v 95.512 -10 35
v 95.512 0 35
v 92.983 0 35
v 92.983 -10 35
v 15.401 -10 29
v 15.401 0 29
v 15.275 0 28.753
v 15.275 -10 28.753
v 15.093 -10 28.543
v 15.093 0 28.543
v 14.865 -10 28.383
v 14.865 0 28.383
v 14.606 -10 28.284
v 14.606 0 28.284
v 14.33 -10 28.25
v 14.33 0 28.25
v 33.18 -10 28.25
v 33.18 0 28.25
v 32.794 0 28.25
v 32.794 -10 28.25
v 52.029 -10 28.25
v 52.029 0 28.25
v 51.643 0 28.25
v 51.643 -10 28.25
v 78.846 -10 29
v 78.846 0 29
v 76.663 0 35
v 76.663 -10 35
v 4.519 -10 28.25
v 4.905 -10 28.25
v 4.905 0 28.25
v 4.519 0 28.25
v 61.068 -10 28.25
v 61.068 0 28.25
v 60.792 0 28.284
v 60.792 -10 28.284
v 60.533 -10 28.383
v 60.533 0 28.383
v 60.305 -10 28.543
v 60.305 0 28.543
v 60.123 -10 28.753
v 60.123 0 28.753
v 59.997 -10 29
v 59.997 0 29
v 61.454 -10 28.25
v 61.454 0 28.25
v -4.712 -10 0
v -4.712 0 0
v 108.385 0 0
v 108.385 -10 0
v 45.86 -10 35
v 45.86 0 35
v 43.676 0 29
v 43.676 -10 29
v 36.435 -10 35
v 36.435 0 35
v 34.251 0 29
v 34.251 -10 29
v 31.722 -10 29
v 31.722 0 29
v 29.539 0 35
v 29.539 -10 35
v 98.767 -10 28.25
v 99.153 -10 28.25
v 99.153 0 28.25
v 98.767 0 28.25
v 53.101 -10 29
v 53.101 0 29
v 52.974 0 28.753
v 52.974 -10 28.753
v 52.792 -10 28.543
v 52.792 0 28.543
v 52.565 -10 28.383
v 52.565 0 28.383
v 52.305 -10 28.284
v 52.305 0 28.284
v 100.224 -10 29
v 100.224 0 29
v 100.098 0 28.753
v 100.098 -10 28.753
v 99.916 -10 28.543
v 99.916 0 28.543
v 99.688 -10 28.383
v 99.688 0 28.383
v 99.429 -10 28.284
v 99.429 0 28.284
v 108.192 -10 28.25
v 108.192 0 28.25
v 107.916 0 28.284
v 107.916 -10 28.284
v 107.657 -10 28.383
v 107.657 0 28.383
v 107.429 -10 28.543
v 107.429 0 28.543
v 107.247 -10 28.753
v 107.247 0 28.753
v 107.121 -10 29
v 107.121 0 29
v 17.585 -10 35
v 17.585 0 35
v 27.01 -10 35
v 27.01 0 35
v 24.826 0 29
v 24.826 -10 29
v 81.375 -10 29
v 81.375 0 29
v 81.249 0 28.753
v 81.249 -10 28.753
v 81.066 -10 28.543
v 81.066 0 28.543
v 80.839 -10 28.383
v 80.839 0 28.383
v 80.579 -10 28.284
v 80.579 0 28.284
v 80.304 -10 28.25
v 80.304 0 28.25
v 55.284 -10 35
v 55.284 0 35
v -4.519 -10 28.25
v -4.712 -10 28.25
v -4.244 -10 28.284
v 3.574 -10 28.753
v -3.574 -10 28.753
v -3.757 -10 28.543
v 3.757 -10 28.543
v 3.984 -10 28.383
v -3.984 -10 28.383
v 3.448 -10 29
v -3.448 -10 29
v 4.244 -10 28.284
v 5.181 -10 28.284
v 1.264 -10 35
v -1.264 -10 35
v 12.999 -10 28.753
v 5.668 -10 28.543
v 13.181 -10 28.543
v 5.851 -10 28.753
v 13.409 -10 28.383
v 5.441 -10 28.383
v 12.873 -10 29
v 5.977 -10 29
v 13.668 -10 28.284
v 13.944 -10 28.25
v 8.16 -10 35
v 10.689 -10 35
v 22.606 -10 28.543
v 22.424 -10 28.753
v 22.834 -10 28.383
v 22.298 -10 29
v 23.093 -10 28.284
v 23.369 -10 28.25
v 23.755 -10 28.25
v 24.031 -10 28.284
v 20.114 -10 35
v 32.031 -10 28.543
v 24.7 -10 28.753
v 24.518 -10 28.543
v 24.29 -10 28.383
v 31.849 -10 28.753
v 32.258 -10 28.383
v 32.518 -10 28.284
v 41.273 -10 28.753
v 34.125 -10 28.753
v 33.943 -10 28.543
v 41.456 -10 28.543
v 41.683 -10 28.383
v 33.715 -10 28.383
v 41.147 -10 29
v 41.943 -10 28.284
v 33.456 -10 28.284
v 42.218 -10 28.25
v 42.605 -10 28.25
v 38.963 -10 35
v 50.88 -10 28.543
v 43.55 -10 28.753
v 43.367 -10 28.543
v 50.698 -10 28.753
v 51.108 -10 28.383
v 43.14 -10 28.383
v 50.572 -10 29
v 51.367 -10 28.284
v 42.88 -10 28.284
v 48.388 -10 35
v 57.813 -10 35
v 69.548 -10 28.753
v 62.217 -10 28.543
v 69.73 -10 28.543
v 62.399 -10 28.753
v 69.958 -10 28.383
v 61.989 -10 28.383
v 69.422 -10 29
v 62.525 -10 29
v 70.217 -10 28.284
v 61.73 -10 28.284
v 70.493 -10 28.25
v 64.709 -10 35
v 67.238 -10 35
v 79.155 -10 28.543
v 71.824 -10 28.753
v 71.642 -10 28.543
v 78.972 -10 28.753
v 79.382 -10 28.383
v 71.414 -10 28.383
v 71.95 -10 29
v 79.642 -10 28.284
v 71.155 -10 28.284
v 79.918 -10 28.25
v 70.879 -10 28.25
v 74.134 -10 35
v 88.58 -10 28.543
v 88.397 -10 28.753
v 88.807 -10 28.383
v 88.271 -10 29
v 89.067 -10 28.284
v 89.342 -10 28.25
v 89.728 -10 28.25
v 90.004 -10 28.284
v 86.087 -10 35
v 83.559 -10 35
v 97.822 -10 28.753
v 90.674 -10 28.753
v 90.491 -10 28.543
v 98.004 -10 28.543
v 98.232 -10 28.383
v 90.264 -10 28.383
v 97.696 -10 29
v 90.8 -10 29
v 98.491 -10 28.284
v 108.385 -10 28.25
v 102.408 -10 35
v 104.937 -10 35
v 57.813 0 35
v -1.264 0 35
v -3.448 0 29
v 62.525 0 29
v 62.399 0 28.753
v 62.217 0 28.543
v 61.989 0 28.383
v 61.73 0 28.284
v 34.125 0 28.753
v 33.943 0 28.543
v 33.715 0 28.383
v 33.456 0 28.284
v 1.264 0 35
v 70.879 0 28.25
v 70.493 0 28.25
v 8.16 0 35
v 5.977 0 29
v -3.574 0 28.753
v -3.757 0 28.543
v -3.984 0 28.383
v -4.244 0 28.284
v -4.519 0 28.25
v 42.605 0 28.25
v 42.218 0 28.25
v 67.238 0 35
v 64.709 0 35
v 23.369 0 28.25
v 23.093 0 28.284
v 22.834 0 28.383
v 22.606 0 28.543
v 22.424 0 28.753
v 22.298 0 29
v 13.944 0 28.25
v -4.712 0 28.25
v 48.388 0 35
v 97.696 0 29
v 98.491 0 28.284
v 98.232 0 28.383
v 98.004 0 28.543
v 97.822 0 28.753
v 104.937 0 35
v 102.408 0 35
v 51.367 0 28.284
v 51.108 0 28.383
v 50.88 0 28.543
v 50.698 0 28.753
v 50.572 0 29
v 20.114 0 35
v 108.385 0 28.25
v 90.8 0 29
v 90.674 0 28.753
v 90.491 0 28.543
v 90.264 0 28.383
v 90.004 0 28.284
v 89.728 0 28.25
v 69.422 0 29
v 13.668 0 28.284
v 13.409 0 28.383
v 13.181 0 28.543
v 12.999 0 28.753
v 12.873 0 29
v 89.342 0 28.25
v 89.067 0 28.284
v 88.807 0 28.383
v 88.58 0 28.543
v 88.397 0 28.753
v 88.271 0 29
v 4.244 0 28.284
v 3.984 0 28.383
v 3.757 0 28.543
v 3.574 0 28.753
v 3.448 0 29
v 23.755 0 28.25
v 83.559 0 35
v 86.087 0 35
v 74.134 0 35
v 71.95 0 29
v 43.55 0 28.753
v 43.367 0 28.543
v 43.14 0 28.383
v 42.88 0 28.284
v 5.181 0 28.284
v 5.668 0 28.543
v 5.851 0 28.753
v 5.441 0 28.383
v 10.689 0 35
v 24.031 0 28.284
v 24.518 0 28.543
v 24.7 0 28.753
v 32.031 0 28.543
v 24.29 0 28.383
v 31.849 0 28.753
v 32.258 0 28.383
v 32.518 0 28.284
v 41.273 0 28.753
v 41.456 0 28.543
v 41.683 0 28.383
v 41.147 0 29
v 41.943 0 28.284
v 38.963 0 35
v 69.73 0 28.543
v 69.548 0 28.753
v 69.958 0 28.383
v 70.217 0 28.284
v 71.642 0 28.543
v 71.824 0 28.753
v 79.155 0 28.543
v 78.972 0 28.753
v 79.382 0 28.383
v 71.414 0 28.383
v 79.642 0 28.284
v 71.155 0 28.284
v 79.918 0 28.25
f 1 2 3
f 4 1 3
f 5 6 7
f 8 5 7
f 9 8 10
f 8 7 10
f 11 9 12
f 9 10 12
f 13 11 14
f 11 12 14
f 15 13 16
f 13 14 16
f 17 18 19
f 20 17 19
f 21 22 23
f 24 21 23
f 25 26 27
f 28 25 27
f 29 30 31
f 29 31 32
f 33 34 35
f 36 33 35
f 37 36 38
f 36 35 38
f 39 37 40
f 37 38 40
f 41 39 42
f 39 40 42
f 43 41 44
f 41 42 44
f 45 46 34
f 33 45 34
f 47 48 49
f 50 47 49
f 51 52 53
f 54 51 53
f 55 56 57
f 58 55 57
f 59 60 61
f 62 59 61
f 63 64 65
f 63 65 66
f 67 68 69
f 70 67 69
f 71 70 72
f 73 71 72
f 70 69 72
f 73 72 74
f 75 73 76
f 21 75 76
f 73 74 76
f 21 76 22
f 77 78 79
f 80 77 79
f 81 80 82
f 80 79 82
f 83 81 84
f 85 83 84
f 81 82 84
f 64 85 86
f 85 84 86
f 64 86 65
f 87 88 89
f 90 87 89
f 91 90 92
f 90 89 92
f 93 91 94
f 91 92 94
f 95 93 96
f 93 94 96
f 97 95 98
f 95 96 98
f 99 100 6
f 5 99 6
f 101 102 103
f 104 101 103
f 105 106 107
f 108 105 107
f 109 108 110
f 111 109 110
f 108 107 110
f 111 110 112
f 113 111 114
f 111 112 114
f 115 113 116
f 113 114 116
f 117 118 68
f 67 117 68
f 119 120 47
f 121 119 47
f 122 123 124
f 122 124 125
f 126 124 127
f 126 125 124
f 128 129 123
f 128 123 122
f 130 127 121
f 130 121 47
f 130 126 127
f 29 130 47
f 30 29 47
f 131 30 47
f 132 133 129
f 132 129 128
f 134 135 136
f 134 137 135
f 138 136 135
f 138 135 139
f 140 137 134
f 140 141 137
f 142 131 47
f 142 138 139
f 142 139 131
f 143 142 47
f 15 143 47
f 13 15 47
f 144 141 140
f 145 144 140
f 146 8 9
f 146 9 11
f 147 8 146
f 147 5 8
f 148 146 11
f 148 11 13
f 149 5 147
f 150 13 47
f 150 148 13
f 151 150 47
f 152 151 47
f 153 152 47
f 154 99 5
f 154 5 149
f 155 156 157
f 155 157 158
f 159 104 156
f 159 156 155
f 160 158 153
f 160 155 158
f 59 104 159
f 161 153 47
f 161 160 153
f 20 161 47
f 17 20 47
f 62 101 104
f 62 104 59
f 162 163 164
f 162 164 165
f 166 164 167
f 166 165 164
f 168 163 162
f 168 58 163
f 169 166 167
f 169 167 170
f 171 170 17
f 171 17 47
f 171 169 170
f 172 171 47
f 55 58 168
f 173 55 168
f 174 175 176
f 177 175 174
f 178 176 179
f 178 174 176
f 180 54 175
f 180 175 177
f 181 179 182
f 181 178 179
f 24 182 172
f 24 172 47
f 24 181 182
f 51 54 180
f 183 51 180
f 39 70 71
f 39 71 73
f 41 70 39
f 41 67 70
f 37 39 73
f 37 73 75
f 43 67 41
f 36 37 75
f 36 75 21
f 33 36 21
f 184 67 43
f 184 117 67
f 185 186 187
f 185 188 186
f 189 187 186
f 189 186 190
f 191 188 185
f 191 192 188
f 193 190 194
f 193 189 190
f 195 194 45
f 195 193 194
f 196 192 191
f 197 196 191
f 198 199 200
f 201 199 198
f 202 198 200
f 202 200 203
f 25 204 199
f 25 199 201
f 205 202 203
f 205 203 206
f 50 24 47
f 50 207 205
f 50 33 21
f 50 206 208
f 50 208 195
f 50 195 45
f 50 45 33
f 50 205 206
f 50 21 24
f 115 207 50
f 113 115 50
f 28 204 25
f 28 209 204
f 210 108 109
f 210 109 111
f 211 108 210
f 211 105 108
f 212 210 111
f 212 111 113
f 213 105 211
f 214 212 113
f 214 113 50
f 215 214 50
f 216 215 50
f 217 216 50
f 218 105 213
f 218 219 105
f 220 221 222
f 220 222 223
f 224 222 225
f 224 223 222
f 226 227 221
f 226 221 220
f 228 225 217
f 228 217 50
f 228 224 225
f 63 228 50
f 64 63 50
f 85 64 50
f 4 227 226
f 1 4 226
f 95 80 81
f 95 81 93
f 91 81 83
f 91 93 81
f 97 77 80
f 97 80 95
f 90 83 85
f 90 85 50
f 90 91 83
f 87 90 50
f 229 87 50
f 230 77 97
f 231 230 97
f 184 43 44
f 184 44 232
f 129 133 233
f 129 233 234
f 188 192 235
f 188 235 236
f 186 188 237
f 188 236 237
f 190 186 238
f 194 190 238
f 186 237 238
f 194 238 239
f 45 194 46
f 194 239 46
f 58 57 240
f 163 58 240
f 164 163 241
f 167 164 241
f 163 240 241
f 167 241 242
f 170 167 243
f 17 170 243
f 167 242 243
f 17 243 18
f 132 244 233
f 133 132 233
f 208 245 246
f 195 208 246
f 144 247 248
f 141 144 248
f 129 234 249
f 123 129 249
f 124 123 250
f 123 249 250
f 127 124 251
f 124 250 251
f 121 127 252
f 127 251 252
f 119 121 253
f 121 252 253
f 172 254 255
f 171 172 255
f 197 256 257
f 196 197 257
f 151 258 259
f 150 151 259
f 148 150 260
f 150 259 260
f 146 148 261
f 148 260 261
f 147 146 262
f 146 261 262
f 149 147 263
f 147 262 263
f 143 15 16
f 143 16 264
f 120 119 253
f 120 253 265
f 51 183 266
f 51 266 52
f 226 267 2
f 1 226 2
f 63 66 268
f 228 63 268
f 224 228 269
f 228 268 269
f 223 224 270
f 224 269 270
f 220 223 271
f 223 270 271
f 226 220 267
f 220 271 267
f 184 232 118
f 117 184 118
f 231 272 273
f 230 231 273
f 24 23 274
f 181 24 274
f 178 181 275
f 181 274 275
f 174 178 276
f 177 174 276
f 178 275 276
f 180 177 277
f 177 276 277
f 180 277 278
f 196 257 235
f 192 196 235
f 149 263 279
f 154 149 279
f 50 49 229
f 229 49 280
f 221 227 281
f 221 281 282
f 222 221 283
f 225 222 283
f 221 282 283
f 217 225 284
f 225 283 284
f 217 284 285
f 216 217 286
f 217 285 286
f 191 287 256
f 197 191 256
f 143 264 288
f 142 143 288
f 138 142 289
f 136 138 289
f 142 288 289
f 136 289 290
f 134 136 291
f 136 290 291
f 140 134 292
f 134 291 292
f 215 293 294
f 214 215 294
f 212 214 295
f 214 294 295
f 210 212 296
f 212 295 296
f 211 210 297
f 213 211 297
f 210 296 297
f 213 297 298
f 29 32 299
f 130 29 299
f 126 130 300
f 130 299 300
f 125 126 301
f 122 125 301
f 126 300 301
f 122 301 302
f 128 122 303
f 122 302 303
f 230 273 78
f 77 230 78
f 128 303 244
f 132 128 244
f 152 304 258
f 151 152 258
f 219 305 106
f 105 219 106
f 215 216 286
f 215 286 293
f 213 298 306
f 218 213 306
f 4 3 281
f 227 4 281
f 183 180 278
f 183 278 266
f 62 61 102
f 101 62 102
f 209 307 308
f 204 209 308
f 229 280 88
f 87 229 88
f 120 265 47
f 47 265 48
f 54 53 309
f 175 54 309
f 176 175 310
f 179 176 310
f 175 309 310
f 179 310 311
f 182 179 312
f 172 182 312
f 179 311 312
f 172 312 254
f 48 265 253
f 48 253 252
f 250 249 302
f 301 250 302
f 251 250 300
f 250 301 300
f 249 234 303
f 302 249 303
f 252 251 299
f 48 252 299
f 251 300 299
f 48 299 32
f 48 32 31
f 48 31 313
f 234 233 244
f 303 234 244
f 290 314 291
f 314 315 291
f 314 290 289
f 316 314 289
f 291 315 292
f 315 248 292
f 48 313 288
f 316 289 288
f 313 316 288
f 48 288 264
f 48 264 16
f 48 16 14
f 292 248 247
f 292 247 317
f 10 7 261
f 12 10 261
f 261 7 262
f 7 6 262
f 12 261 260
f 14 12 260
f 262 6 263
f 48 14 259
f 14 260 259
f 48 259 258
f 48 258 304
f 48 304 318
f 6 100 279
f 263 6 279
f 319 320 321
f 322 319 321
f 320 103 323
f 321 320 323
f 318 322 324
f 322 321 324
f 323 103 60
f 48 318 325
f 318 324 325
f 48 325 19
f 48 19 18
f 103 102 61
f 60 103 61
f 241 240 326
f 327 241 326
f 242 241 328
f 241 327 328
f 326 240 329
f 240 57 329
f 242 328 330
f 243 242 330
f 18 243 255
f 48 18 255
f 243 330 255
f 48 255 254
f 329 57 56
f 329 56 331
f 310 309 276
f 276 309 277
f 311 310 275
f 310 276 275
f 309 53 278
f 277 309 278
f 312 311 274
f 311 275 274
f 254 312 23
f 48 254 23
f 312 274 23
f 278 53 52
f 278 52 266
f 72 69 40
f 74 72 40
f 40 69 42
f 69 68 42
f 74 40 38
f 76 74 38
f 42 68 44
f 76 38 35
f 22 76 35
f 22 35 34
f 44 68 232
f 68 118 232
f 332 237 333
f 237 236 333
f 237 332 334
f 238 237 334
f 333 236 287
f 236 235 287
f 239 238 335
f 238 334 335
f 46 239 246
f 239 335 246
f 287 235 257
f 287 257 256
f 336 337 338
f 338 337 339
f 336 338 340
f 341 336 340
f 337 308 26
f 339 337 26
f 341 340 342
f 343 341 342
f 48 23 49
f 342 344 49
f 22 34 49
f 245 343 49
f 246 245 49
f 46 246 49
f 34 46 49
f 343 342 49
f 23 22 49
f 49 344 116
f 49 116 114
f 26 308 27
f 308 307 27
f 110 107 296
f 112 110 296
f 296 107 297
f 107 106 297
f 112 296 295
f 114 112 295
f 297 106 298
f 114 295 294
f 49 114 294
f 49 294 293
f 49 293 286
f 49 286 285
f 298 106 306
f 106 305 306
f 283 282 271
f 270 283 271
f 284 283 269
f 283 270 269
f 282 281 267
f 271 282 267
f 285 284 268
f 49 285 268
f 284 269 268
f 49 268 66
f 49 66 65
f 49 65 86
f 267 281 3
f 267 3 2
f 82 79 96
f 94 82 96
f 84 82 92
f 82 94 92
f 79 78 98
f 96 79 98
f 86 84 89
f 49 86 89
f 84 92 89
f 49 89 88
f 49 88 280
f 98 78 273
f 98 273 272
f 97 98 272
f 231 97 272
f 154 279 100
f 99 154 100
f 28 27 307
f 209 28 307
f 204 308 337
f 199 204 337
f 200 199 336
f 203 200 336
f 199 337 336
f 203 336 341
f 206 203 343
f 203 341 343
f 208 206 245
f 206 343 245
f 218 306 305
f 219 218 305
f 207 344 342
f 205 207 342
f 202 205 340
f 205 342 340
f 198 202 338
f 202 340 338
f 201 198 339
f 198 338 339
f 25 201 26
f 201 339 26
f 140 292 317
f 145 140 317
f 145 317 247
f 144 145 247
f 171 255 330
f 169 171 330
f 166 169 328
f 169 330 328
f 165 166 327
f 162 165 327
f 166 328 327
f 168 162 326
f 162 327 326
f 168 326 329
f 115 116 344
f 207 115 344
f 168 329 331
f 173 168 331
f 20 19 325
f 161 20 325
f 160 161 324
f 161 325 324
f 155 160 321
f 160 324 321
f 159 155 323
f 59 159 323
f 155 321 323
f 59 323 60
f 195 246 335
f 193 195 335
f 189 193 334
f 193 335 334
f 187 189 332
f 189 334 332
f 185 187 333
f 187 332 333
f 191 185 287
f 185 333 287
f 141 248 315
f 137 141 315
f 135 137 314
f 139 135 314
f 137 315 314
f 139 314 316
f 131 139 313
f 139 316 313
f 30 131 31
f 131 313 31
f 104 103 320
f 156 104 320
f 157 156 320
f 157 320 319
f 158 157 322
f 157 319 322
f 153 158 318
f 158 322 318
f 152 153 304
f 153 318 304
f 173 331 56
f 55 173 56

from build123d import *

# Parameters (mm, degrees)
F2_DEPTH = 10


with BuildPart() as f2:
    # F1 (on Front) → F2 (new body)
    with BuildSketch(Plane.XZ):
        with BuildLine():
            Line((3.4480698746, 29.0000970366), (1.2642837874, 35))
            Line((1.2642837874, 35), (-1.2642837874, 35))
            Line((-1.2642837874, 35), (-3.4480698746, 29.0000970366))
            ThreePointArc((-3.4480698746, 29.0000970366), (-3.8654423248, 28.4561666695), (-4.5193194622, 28.25))
            Line((-4.5193194622, 28.25), (-4.7123889804, 28.25))
            Line((-4.7123889804, 28.25), (-4.7123889804, 0))
            Line((-4.7123889804, 0), (4.7123889804, 0))
            Line((4.7123889804, 0), (4.7123889804, 28.25))
            Line((4.7123889804, 28.25), (4.5193194622, 28.25))
            ThreePointArc((4.5193194622, 28.25), (3.8654423248, 28.4561666695), (3.4480698746, 29.0000970366))
        make_face()
        with BuildLine():
            Line((4.9054584985, 28.25), (4.7123889804, 28.25))
            Line((4.7123889804, 28.25), (4.7123889804, 0))
            Line((4.7123889804, 0), (14.1371669412, 0))
            Line((14.1371669412, 0), (14.1371669412, 28.25))
            Line((14.1371669412, 28.25), (13.944097423, 28.25))
            ThreePointArc((13.944097423, 28.25), (13.2902202856, 28.4561666695), (12.8728478353, 29.0000970366))
            Line((12.8728478353, 29.0000970366), (10.6890617482, 35))
            Line((10.6890617482, 35), (8.1604941734, 35))
            Line((8.1604941734, 35), (5.9767080862, 29.0000970366))
            ThreePointArc((5.9767080862, 29.0000970366), (5.559335636, 28.4561666695), (4.9054584985, 28.25))
        make_face()
        with BuildLine():
            Line((14.1371669412, 28.25), (14.1371669412, 0))
            Line((14.1371669412, 0), (23.5619449019, 0))
            Line((23.5619449019, 0), (23.5619449019, 28.25))
            Line((23.5619449019, 28.25), (23.3688753838, 28.25))
            ThreePointArc((23.3688753838, 28.25), (22.7149982463, 28.4561666695), (22.2976257961, 29.0000970366))
            Line((22.2976257961, 29.0000970366), (20.1138397089, 35))
            Line((20.1138397089, 35), (17.5852721341, 35))
            Line((17.5852721341, 35), (15.401486047, 29.0000970366))
            ThreePointArc((15.401486047, 29.0000970366), (14.9841135967, 28.4561666695), (14.3302364593, 28.25))
            Line((14.3302364593, 28.25), (14.1371669412, 28.25))
        make_face()
        with BuildLine():
            Line((23.5619449019, 28.25), (23.5619449019, 0))
            Line((23.5619449019, 0), (32.9867228627, 0))
            Line((32.9867228627, 0), (32.9867228627, 28.25))
            Line((32.9867228627, 28.25), (32.7936533446, 28.25))
            ThreePointArc((32.7936533446, 28.25), (32.1397762071, 28.4561666695), (31.7224037569, 29.0000970366))
            Line((31.7224037569, 29.0000970366), (29.5386176697, 35))
            Line((29.5386176697, 35), (27.0100500949, 35))
            Line((27.0100500949, 35), (24.8262640078, 29.0000970366))
            ThreePointArc((24.8262640078, 29.0000970366), (24.4088915575, 28.4561666695), (23.7550144201, 28.25))
            Line((23.7550144201, 28.25), (23.5619449019, 28.25))
        make_face()
        with BuildLine():
            Line((32.9867228627, 28.25), (32.9867228627, 0))
            Line((32.9867228627, 0), (42.4115008235, 0))
            Line((42.4115008235, 0), (42.4115008235, 28.25))
            Line((42.4115008235, 28.25), (42.2184313053, 28.25))
            ThreePointArc((42.2184313053, 28.25), (41.5645541679, 28.4561666695), (41.1471817176, 29.0000970366))
            Line((41.1471817176, 29.0000970366), (38.9633956305, 35))
            Line((38.9633956305, 35), (36.4348280557, 35))
            Line((36.4348280557, 35), (34.2510419685, 29.0000970366))
            ThreePointArc((34.2510419685, 29.0000970366), (33.8336695183, 28.4561666695), (33.1797923808, 28.25))
            Line((33.1797923808, 28.25), (32.9867228627, 28.25))
        make_face()
        with BuildLine():
            Line((42.4115008235, 28.25), (42.4115008235, 0))
            Line((42.4115008235, 0), (51.8362787842, 0))
            Line((51.8362787842, 0), (51.8362787842, 28.25))
            Line((51.8362787842, 28.25), (51.6432092661, 28.25))
            ThreePointArc((51.6432092661, 28.25), (50.9893321287, 28.4561666695), (50.5719596784, 29.0000970366))
            Line((50.5719596784, 29.0000970366), (48.3881735912, 35))
            Line((48.3881735912, 35), (45.8596060165, 35))
            Line((45.8596060165, 35), (43.6758199293, 29.0000970366))
            ThreePointArc((43.6758199293, 29.0000970366), (43.258447479, 28.4561666695), (42.6045703416, 28.25))
            Line((42.6045703416, 28.25), (42.4115008235, 28.25))
        make_face()
        with BuildLine():
            Line((51.8362787842, 28.25), (51.8362787842, 0))
            Line((51.8362787842, 0), (61.261056745, 0))
            Line((61.261056745, 0), (61.261056745, 28.25))
            Line((61.261056745, 28.25), (61.0679872269, 28.25))
            ThreePointArc((61.0679872269, 28.25), (60.4141100894, 28.4561666695), (59.9967376392, 29.0000970366))
            Line((59.9967376392, 29.0000970366), (57.812951552, 35))
            Line((57.812951552, 35), (55.2843839772, 35))
            Line((55.2843839772, 35), (53.1005978901, 29.0000970366))
            ThreePointArc((53.1005978901, 29.0000970366), (52.6832254398, 28.4561666695), (52.0293483024, 28.25))
            Line((52.0293483024, 28.25), (51.8362787842, 28.25))
        make_face()
        with BuildLine():
            Line((61.261056745, 28.25), (61.261056745, 0))
            Line((61.261056745, 0), (70.6858347058, 0))
            Line((70.6858347058, 0), (70.6858347058, 28.25))
            Line((70.6858347058, 28.25), (70.4927651876, 28.25))
            ThreePointArc((70.4927651876, 28.25), (69.8388880502, 28.4561666695), (69.4215155999, 29.0000970366))
            Line((69.4215155999, 29.0000970366), (67.2377295128, 35))
            Line((67.2377295128, 35), (64.709161938, 35))
            Line((64.709161938, 35), (62.5253758508, 29.0000970366))
            ThreePointArc((62.5253758508, 29.0000970366), (62.1080034006, 28.4561666695), (61.4541262631, 28.25))
            Line((61.4541262631, 28.25), (61.261056745, 28.25))
        make_face()
        with BuildLine():
            Line((70.6858347058, 28.25), (70.6858347058, 0))
            Line((70.6858347058, 0), (80.1106126665, 0))
            Line((80.1106126665, 0), (80.1106126665, 28.25))
            Line((80.1106126665, 28.25), (79.9175431484, 28.25))
            ThreePointArc((79.9175431484, 28.25), (79.263666011, 28.4561666695), (78.8462935607, 29.0000970366))
            Line((78.8462935607, 29.0000970366), (76.6625074735, 35))
            Line((76.6625074735, 35), (74.1339398988, 35))
            Line((74.1339398988, 35), (71.9501538116, 29.0000970366))
            ThreePointArc((71.9501538116, 29.0000970366), (71.5327813613, 28.4561666695), (70.8789042239, 28.25))
            Line((70.8789042239, 28.25), (70.6858347058, 28.25))
        make_face()
        with BuildLine():
            Line((80.1106126665, 28.25), (80.1106126665, 0))
            Line((80.1106126665, 0), (89.5353906273, 0))
            Line((89.5353906273, 0), (89.5353906273, 28.25))
            Line((89.5353906273, 28.25), (89.3423211092, 28.25))
            ThreePointArc((89.3423211092, 28.25), (88.6884439717, 28.4561666695), (88.2710715215, 29.0000970366))
            Line((88.2710715215, 29.0000970366), (86.0872854343, 35))
            Line((86.0872854343, 35), (83.5587178595, 35))
            Line((83.5587178595, 35), (81.3749317724, 29.0000970366))
            ThreePointArc((81.3749317724, 29.0000970366), (80.9575593221, 28.4561666695), (80.3036821847, 28.25))
            Line((80.3036821847, 28.25), (80.1106126665, 28.25))
        make_face()
        with BuildLine():
            Line((89.5353906273, 28.25), (89.5353906273, 0))
            Line((89.5353906273, 0), (98.9601685881, 0))
            Line((98.9601685881, 0), (98.9601685881, 28.25))
            Line((98.9601685881, 28.25), (98.7670990699, 28.25))
            ThreePointArc((98.7670990699, 28.25), (98.1132219325, 28.4561666695), (97.6958494822, 29.0000970366))
            Line((97.6958494822, 29.0000970366), (95.5120633951, 35))
            Line((95.5120633951, 35), (92.9834958203, 35))
            Line((92.9834958203, 35), (90.7997097331, 29.0000970366))
            ThreePointArc((90.7997097331, 29.0000970366), (90.3823372829, 28.4561666695), (89.7284601454, 28.25))
            Line((89.7284601454, 28.25), (89.5353906273, 28.25))
        make_face()
        with BuildLine():
            Line((98.9601685881, 28.25), (98.9601685881, 0))
            Line((98.9601685881, 0), (108.3849465488, 0))
            Line((108.3849465488, 0), (108.3849465488, 28.25))
            Line((108.3849465488, 28.25), (108.1918770307, 28.25))
            ThreePointArc((108.1918770307, 28.25), (107.5379998933, 28.4561666695), (107.120627443, 29.0000970366))
            Line((107.120627443, 29.0000970366), (104.9368413559, 35))
            Line((104.9368413559, 35), (102.4082737811, 35))
            Line((102.4082737811, 35), (100.2244876939, 29.0000970366))
            ThreePointArc((100.2244876939, 29.0000970366), (99.8071152437, 28.4561666695), (99.1532381062, 28.25))
            Line((99.1532381062, 28.25), (98.9601685881, 28.25))
        make_face()
    extrude(amount=F2_DEPTH)


solid = f2.part
